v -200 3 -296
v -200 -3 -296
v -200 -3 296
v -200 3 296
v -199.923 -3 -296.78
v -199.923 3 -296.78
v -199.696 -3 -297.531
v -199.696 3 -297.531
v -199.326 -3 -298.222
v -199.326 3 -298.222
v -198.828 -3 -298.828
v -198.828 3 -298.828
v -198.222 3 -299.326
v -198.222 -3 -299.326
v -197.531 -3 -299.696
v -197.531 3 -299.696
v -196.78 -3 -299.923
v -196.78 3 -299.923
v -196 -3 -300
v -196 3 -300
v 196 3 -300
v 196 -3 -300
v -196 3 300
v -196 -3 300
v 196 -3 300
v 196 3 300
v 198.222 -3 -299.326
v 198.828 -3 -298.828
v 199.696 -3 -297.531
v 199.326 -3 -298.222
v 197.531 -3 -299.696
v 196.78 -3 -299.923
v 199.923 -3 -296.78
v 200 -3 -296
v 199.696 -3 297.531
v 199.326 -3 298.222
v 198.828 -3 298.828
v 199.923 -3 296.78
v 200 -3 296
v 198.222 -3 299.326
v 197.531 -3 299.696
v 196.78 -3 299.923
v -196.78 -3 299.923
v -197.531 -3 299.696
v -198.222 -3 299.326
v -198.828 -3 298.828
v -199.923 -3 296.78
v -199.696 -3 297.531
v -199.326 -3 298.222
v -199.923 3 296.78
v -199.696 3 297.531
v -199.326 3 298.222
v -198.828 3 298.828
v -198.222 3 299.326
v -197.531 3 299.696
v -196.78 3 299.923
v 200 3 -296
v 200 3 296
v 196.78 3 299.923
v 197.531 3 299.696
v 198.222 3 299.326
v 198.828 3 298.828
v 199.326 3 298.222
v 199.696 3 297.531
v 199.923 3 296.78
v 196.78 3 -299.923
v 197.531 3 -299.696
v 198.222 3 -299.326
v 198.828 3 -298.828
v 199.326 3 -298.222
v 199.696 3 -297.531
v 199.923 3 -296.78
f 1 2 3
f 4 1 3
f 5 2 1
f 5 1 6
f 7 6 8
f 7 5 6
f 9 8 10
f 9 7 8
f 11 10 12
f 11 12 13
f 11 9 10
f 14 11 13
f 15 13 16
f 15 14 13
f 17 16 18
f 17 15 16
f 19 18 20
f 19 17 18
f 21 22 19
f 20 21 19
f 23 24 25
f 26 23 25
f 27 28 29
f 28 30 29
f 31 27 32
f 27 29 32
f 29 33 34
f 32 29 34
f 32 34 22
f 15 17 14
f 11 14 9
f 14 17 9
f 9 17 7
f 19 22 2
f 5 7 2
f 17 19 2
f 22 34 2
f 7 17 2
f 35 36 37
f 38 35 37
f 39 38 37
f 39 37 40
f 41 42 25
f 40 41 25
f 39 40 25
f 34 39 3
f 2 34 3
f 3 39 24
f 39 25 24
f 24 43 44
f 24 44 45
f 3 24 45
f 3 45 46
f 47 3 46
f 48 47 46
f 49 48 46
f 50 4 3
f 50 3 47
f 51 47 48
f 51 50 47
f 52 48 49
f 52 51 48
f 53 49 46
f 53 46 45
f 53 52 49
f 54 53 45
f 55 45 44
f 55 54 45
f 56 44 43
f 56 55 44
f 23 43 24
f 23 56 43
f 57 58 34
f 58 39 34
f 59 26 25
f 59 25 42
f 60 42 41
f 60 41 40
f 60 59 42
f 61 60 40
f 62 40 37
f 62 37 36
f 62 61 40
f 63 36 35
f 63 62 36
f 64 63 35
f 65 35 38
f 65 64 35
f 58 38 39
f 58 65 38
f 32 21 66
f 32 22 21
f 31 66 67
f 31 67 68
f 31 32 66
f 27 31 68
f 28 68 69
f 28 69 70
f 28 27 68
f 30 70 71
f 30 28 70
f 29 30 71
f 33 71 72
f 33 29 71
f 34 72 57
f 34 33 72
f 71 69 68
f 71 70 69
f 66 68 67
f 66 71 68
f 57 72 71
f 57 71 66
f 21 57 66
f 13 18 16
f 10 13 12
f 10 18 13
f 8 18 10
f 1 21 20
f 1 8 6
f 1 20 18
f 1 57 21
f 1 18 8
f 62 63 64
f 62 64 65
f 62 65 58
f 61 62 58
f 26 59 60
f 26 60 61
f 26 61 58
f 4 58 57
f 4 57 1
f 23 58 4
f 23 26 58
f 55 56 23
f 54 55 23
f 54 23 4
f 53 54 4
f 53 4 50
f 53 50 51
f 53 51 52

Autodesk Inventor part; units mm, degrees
sketch "Эскиз1" plane through (0, 0, 0) normal (0, 1, 0) x (-1, 0, 0)
  line L0 (200, 300) -> (-200, 300)
  line L1 (-200, 300) -> (-200, -300)
  line L2 (-200, -300) -> (200, -300)
  line L3 (200, -300) -> (200, 300)
  line L4 (200, 300) -> (-200, -300) construction
  line L5 (-200, 300) -> (200, -300) construction
  point P0 (0, 0)
  dimension "d0" = 600
  dimension "d1" = 400
extrude "Выдавливание1" add sketch "Эскиз1" along normal mid plane 6
fillet "Сопряжение1" radius 4 4 edges at (-200, 0, -300) (200, 0, -300) (200, 0, 300) (-200, 0, 300)
properties part number "platform"
